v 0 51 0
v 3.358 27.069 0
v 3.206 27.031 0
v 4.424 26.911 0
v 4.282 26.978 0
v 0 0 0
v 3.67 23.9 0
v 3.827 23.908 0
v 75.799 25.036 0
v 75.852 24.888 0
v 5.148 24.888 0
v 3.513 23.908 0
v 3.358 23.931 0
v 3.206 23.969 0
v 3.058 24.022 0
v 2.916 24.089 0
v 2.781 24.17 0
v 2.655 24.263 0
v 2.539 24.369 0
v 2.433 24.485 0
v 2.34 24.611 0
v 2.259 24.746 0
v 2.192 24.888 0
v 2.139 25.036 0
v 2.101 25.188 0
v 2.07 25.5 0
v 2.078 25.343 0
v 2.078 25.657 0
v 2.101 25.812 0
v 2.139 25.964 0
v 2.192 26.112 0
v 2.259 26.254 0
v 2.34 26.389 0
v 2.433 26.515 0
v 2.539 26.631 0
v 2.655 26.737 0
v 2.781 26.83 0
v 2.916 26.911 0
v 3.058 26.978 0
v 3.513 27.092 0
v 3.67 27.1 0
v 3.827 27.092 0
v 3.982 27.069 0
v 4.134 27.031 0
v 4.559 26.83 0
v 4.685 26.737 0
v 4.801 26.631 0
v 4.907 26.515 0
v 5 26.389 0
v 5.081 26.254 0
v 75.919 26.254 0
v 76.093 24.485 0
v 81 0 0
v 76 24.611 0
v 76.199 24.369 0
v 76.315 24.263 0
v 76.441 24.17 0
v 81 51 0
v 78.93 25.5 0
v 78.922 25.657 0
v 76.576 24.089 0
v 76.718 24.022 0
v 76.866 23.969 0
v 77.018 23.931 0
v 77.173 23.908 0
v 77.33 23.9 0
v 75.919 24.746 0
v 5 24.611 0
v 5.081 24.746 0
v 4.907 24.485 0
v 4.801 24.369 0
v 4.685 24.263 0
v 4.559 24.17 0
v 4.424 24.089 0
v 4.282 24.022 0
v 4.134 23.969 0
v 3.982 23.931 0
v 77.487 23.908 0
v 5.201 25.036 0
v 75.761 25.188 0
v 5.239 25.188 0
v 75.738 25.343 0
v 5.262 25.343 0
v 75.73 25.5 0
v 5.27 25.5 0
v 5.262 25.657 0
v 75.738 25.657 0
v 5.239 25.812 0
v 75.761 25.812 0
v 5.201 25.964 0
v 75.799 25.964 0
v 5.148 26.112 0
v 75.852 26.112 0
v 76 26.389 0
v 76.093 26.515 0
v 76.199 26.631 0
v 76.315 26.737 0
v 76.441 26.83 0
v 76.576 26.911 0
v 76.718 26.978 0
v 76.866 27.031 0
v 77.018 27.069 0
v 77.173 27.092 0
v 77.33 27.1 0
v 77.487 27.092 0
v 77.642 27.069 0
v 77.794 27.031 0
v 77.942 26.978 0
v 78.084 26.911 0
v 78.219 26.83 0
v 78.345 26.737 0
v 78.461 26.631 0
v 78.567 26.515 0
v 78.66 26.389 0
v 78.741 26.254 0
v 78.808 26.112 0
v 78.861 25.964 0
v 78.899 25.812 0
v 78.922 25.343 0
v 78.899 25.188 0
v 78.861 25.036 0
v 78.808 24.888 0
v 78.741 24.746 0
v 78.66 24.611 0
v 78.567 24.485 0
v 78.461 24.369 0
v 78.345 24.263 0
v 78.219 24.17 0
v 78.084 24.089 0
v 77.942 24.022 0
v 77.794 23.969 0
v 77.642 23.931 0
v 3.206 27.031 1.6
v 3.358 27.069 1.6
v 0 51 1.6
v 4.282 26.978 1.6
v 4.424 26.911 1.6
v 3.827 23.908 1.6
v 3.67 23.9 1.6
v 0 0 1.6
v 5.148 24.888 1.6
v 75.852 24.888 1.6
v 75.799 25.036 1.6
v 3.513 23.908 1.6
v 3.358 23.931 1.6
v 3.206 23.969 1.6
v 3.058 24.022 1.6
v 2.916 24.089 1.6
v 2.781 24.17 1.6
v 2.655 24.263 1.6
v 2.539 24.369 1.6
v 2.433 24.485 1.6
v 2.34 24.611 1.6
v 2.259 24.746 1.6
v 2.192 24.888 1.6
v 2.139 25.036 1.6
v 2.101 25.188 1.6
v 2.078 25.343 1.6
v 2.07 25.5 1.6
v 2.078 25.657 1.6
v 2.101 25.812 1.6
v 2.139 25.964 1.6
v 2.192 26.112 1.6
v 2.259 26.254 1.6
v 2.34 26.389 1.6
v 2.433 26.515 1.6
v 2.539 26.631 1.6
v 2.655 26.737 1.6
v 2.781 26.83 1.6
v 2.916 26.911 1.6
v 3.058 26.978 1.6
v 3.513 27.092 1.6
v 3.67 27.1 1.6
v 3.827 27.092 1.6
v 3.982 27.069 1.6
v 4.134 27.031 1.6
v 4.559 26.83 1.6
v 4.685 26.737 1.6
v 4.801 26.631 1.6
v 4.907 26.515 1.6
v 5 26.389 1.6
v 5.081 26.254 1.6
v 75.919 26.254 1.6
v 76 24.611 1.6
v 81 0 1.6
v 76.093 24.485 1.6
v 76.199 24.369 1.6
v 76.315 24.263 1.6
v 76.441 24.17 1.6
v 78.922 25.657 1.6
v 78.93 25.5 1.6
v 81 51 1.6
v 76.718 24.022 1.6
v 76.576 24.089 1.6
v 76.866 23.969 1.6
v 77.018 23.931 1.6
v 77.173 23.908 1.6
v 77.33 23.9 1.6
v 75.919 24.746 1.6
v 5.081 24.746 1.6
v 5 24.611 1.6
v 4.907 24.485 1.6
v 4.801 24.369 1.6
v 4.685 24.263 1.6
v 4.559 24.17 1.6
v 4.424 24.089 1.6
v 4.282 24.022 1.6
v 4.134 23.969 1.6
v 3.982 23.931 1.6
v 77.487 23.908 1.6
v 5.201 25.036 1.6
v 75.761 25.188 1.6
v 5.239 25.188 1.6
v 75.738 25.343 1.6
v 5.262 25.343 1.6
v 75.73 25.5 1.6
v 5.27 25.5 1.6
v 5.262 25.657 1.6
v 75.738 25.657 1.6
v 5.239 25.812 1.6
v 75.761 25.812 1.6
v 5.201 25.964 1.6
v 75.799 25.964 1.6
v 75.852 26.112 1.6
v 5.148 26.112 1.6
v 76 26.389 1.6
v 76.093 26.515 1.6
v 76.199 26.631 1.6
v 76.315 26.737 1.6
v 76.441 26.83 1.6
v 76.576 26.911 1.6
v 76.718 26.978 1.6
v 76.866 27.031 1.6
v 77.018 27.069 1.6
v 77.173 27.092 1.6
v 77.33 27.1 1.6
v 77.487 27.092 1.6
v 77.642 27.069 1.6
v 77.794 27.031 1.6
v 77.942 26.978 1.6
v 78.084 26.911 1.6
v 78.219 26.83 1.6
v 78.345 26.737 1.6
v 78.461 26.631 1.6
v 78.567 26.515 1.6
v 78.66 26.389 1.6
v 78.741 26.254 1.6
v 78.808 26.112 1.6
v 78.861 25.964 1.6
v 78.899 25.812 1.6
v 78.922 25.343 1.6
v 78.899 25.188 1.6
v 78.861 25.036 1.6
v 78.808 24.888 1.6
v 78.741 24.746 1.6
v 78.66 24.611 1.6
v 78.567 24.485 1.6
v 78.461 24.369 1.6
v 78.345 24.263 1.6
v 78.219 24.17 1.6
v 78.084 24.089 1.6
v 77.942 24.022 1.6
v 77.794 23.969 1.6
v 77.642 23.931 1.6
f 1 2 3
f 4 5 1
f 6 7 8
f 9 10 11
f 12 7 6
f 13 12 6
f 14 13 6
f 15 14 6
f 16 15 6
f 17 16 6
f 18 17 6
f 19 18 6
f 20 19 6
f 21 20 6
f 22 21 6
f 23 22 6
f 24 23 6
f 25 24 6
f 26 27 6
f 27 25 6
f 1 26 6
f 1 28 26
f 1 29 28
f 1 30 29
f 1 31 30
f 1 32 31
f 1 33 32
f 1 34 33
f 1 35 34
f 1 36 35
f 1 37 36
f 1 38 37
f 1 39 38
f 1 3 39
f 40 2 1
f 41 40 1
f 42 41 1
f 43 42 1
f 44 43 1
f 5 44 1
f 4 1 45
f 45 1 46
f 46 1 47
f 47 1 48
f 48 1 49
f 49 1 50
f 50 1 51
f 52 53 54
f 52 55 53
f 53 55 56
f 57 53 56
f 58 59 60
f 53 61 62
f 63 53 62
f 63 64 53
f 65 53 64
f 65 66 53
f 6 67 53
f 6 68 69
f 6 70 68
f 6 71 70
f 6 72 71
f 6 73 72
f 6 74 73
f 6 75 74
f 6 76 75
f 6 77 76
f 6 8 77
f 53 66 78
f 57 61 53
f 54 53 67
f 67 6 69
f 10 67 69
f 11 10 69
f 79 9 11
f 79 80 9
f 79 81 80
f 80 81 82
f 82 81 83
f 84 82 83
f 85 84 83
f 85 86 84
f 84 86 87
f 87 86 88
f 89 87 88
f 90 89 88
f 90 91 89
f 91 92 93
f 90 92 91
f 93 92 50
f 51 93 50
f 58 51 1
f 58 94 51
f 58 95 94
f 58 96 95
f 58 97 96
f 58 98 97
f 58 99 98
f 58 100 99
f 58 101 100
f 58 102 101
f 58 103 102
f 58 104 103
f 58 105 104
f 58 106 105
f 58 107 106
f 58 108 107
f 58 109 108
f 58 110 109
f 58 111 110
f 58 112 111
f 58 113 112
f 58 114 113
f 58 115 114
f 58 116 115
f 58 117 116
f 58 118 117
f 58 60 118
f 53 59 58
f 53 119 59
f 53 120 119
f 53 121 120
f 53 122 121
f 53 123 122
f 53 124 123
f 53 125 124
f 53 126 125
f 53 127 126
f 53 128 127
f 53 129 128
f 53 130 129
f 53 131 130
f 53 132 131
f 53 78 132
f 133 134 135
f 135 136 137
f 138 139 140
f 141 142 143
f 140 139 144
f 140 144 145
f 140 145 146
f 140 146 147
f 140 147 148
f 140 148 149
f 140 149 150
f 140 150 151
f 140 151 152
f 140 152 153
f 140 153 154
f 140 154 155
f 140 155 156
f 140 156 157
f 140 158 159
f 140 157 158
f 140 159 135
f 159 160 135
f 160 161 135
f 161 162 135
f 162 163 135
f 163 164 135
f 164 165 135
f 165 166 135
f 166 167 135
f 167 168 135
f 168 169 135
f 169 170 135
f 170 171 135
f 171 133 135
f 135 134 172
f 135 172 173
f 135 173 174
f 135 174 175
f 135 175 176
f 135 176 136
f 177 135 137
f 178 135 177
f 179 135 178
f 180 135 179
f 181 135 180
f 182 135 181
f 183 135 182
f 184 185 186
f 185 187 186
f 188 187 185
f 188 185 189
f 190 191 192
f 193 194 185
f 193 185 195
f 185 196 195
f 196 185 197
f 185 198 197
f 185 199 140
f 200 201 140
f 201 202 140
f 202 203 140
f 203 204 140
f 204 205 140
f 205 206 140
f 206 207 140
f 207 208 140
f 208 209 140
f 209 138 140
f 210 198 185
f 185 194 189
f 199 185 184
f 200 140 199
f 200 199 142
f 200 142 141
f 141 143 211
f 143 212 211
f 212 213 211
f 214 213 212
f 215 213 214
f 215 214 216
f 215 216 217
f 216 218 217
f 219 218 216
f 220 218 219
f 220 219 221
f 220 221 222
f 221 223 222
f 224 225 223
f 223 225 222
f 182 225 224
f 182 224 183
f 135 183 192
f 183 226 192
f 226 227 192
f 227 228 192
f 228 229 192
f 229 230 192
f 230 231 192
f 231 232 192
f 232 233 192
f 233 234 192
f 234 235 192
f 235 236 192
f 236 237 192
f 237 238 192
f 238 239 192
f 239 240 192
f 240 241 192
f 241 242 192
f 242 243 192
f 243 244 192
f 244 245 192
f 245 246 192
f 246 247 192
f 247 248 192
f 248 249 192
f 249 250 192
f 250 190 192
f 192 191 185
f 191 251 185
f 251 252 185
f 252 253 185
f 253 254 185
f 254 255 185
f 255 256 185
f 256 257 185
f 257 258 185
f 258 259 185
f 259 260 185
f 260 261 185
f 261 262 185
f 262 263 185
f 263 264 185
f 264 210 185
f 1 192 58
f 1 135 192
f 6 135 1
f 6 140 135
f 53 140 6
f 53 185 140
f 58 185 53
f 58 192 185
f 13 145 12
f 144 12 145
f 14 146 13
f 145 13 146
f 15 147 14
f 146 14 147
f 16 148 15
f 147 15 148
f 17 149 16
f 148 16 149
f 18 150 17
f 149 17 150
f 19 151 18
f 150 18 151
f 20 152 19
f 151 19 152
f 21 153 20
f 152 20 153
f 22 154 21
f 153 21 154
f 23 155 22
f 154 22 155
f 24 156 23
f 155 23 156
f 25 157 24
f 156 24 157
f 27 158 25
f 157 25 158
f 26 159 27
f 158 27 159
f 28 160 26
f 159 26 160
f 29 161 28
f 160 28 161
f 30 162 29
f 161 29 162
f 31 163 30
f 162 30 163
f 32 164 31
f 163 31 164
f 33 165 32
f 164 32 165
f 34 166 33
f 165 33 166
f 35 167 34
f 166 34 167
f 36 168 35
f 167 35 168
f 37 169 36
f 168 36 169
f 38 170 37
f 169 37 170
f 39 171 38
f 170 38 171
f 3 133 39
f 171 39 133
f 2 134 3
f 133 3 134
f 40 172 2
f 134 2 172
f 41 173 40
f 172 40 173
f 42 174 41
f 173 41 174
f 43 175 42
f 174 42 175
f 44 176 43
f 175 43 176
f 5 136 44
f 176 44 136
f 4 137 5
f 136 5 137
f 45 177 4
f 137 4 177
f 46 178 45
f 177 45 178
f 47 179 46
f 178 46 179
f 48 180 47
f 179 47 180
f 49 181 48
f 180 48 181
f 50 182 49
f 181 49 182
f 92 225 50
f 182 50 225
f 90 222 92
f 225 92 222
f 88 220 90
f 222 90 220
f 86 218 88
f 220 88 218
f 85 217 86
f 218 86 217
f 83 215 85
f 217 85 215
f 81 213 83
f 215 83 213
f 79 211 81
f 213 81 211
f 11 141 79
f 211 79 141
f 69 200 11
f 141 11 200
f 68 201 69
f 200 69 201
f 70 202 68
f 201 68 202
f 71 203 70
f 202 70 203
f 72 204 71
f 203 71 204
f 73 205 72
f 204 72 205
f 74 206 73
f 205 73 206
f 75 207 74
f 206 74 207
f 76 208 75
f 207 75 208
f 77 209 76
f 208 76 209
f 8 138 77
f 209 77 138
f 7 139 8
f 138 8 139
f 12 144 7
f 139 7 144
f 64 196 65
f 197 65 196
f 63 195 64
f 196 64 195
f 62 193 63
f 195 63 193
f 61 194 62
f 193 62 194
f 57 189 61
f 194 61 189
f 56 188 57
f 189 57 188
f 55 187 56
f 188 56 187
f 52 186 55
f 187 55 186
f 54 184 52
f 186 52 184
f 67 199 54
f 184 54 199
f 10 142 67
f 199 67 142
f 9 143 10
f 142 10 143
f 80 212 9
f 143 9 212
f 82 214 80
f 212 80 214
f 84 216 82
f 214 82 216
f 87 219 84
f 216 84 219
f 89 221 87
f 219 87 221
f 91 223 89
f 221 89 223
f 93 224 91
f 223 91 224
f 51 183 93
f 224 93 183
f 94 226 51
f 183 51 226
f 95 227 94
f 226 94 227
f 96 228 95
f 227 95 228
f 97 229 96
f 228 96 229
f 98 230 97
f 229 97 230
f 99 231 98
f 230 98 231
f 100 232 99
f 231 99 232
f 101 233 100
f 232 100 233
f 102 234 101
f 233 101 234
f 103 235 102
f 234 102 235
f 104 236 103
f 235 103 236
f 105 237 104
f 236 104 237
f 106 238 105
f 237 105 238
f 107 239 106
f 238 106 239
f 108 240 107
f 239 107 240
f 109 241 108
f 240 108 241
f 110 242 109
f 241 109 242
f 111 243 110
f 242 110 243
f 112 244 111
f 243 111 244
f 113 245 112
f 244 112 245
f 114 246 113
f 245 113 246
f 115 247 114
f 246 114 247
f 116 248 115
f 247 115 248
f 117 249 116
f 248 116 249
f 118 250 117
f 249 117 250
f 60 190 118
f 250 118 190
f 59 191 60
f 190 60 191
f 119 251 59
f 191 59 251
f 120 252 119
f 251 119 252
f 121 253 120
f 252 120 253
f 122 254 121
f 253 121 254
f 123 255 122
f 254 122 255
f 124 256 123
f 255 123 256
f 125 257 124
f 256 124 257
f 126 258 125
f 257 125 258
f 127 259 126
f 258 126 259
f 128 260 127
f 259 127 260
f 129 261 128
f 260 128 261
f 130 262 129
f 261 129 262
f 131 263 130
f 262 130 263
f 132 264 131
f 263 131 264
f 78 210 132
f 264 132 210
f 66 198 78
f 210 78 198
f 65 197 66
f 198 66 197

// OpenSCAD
/**
 * Adafruit Prototyping Board (571 holes)
 * https://www.adafruit.com/product/571
 */

// pcb
ada_pcb571_width = 81;
ada_pcb571_length = 51;
ada_pcb571_height = 1.6;

// mount holes
ada_pcb571_mount_radius = 3.2 / 2;
ada_pcb571_mount_width = 73.66;
ada_pcb571_mount_length = 0;

// parts
ada_pcb571_parts_height = 25;

// clearance dimensions
ada_pcb571_total_height = ada_pcb571_height + ada_pcb571_parts_height;

/**
 * Mount Holes
 */
module ada_pcb571_mount_holes() {
    offset_width = 0.5 * (ada_pcb571_width - ada_pcb571_mount_width);
    offset_length = 0.5 * (ada_pcb571_length - ada_pcb571_mount_length);

    translate([
        offset_width,
        offset_length
    ])
    circle(ada_pcb571_mount_radius);

    translate([
        ada_pcb571_width - offset_width,
        offset_length
    ])
    circle(ada_pcb571_mount_radius);

    translate([
        offset_width,
        ada_pcb571_length - offset_length
    ])
    circle(ada_pcb571_mount_radius);

    translate([
        ada_pcb571_width - offset_width,
        ada_pcb571_length - offset_length
    ])
    circle(ada_pcb571_mount_radius);
}

/**
 * PCB
 */
module ada_pcb571(include_pins=$preview, show_parts=$preview) {
    // board
    color([0.8, 0.6, 0.45])
    linear_extrude(ada_pcb571_height) {
        difference() {
            // board
            square([ada_pcb571_width, ada_pcb571_length]);
            
            // mount holes
            ada_pcb571_mount_holes();
        }
    }
    
    // mounting pins
    if (include_pins) {
        ada_pcb571_mount_pins();
    }
    
    // clearance region for mounted parts
    if (show_parts) {
        color("gray", 0.25)
        translate([0, 0, ada_pcb571_height + 0.1])
        cube([
            ada_pcb571_width,
            ada_pcb571_length,
            ada_pcb571_parts_height - 0.1
        ]);
    }
}

/**
 * Mount Pins
 */
module ada_pcb571_mount_pins() {
    color("grey")
    linear_extrude(2.4 * ada_pcb571_height) {
        offset(r=-0.4) {
            ada_pcb571_mount_holes();
        }
    }
}

/**
 * Preview
 */
ada_pcb571_preview = true;
if (ada_pcb571_preview) {
    $fn = 64;
    ada_pcb571();
}
